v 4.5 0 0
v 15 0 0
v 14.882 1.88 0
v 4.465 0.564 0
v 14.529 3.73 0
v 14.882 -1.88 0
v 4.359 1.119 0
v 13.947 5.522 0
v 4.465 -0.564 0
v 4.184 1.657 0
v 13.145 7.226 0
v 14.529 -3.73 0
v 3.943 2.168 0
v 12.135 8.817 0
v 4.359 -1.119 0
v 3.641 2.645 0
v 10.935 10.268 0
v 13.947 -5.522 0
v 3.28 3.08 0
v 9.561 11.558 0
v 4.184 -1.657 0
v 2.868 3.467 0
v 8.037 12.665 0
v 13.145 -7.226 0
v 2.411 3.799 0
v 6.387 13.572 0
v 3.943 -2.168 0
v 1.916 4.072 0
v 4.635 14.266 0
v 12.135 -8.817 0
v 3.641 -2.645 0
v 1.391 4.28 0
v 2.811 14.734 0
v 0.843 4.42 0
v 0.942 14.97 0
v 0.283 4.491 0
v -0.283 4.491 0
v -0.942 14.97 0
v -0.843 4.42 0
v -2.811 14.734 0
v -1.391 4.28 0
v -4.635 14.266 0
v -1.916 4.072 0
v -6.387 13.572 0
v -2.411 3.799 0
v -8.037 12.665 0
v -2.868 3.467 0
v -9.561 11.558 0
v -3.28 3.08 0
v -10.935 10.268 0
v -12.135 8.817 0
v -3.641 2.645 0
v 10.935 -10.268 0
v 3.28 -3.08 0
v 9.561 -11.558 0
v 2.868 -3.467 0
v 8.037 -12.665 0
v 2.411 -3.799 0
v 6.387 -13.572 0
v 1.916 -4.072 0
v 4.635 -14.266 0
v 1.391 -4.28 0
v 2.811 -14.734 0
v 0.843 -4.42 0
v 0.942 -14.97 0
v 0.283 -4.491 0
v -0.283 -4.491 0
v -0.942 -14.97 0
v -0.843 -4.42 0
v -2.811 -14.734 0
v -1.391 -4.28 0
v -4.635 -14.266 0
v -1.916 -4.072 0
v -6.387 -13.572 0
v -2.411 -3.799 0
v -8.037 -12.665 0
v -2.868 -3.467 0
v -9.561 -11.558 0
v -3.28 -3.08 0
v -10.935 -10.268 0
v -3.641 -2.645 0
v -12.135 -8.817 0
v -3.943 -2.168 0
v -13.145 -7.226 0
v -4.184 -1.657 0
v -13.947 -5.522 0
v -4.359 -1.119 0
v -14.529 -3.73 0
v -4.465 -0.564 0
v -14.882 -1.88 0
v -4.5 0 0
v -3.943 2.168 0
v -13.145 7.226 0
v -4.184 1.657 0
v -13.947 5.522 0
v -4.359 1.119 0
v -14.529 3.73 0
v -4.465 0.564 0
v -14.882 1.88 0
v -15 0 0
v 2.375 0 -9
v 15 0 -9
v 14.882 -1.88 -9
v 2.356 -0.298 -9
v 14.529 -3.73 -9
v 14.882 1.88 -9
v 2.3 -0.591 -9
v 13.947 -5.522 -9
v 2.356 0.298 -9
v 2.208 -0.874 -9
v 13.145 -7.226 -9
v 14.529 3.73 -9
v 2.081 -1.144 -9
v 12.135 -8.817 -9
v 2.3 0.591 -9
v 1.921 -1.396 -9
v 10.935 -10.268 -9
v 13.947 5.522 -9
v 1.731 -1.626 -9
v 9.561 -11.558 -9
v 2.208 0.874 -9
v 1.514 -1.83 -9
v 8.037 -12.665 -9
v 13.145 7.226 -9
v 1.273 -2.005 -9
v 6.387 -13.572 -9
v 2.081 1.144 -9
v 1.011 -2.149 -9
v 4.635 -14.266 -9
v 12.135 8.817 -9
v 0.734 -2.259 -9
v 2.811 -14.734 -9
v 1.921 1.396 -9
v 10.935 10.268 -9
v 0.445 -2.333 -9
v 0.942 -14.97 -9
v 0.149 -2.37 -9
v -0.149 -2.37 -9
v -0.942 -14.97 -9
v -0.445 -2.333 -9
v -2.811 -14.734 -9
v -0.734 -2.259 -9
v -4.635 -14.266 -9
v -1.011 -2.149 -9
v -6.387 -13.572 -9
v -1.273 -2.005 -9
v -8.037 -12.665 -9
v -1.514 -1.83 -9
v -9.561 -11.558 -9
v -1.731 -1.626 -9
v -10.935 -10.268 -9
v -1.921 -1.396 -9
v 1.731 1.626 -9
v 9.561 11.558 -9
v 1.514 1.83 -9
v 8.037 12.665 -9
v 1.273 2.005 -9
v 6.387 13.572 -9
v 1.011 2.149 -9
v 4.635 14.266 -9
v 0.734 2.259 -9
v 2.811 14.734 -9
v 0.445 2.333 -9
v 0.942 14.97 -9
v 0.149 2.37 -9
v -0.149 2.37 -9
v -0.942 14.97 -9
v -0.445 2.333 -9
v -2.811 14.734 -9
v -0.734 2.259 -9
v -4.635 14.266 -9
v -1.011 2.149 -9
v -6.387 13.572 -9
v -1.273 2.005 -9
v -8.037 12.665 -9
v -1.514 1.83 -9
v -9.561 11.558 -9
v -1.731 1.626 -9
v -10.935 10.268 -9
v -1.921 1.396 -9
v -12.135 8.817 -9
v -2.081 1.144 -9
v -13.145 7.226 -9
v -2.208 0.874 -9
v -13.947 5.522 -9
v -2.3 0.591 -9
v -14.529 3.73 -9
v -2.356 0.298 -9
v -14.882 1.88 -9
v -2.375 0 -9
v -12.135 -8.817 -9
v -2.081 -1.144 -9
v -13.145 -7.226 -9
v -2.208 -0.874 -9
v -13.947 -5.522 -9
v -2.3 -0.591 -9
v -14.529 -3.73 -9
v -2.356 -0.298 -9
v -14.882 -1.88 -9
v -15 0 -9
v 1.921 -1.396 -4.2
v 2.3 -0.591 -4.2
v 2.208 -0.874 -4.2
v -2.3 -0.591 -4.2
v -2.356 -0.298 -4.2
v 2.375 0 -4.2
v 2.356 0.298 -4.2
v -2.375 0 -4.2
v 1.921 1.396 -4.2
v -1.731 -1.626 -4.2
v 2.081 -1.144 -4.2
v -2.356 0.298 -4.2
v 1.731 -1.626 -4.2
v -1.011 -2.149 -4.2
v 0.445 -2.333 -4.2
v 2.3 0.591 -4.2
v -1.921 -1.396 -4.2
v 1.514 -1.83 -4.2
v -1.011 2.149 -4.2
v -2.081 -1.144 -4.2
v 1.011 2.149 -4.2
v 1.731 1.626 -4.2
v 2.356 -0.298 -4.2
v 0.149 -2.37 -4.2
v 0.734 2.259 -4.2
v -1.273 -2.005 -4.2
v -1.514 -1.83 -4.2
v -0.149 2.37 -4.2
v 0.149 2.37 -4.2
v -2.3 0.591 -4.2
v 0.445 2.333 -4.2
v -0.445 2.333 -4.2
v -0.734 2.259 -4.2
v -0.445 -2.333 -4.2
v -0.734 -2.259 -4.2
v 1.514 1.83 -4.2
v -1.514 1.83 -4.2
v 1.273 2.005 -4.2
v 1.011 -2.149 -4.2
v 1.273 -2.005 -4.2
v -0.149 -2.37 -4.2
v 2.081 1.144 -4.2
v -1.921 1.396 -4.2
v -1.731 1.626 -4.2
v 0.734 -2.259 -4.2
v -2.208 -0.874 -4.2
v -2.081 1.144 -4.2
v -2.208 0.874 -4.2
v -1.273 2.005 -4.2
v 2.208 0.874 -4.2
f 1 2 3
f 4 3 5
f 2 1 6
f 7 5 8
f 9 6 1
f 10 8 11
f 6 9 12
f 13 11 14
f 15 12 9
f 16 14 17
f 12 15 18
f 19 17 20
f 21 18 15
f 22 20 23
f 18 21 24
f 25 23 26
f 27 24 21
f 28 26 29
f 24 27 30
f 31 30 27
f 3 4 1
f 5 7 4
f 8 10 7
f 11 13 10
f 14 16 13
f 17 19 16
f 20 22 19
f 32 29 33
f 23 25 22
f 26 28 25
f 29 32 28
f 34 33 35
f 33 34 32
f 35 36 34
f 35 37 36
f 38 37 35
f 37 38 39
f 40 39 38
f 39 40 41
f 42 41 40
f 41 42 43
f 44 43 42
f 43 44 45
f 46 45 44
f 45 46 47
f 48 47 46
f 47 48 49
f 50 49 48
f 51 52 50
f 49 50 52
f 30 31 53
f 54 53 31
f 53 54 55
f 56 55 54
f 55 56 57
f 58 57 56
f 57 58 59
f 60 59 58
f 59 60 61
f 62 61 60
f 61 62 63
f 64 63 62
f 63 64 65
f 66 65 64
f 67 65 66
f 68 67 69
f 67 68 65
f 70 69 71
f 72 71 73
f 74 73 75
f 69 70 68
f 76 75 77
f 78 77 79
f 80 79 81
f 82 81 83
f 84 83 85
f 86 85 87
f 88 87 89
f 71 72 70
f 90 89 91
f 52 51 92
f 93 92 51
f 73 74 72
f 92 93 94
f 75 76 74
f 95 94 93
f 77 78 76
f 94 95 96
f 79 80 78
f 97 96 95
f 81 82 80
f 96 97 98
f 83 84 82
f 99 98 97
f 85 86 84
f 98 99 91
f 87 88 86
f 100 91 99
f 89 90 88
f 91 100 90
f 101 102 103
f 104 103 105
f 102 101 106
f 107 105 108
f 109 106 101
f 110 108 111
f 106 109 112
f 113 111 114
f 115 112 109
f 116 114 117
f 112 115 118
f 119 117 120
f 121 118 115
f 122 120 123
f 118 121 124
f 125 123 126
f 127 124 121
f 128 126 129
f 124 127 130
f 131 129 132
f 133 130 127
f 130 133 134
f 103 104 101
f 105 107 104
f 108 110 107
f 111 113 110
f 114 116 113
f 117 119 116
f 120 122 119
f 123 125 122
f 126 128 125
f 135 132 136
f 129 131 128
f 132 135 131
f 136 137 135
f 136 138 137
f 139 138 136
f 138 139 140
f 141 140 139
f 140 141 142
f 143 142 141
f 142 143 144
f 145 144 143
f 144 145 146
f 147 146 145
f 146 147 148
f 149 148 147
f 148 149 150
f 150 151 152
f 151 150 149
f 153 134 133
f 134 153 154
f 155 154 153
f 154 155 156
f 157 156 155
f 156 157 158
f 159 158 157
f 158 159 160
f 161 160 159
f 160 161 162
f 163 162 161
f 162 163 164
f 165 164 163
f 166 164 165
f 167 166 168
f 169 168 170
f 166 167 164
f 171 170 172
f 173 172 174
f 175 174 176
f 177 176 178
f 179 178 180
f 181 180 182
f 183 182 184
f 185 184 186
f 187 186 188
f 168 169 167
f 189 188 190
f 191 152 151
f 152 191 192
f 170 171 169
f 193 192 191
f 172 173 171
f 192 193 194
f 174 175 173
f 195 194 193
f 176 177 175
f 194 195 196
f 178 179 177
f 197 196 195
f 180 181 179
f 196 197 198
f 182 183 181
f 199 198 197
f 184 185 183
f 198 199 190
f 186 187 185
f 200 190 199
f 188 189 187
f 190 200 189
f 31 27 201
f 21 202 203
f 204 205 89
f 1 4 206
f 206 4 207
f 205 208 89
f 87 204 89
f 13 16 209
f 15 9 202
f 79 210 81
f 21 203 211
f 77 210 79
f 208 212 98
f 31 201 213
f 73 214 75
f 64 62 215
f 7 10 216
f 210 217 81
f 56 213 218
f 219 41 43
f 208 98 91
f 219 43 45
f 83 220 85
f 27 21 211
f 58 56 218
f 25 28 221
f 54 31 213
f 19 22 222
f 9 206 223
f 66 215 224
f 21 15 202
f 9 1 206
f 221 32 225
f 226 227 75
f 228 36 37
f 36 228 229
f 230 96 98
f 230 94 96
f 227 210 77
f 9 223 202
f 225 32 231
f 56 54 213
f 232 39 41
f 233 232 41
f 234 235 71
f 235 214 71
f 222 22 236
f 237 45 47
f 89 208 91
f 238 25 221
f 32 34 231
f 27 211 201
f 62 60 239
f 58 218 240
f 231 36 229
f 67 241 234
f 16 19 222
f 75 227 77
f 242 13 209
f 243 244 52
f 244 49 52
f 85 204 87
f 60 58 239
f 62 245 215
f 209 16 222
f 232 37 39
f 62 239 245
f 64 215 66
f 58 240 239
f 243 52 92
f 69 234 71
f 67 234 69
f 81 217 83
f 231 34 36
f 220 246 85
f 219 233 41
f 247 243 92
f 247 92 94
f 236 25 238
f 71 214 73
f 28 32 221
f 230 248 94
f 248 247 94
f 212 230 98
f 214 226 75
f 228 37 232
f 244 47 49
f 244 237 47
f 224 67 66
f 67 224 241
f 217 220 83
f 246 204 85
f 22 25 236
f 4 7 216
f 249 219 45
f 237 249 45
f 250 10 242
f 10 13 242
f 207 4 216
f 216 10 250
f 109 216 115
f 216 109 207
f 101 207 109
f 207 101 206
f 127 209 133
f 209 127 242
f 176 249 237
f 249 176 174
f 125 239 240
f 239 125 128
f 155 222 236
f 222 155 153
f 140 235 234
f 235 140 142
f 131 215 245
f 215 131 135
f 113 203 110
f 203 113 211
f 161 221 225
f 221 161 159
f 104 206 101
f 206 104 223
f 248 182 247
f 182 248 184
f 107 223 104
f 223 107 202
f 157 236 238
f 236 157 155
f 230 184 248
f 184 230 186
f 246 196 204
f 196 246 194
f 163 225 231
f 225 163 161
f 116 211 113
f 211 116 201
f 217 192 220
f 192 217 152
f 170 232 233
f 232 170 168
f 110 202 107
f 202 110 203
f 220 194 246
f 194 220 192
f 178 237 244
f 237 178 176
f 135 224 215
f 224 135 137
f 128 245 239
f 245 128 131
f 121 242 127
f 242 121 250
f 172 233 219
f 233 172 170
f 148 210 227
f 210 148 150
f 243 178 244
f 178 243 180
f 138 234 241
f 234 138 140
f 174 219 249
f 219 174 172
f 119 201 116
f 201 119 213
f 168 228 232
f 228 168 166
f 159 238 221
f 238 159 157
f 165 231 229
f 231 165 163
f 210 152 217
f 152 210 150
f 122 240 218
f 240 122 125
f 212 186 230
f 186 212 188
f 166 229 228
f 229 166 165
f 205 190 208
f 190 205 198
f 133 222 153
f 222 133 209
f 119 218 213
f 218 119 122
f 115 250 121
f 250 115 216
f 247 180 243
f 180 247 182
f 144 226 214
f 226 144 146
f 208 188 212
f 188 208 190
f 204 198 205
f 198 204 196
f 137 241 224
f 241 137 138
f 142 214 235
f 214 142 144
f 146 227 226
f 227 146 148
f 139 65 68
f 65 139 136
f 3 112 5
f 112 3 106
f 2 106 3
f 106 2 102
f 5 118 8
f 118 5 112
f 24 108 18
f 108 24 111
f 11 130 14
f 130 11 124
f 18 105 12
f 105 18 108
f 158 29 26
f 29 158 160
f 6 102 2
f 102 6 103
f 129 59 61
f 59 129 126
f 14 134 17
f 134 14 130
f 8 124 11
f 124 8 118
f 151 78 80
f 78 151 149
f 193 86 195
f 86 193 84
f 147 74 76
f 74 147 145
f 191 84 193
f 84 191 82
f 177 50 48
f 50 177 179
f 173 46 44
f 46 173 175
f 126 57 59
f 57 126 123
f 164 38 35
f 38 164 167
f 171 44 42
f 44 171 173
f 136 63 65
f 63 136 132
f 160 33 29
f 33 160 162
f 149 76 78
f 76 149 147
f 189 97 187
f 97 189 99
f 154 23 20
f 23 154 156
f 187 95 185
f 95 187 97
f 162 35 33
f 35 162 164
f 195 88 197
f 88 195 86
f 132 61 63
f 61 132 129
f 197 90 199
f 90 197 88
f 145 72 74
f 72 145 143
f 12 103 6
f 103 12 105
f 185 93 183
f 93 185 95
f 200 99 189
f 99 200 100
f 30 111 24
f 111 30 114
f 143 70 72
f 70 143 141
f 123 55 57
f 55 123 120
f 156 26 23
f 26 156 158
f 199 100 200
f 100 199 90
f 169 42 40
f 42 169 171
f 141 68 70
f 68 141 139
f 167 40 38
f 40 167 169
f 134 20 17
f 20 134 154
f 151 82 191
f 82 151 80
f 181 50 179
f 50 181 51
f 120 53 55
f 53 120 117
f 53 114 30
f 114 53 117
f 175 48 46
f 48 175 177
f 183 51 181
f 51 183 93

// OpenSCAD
$fn = 50;


difference() {
	union() {
		translate(v = [0, 0, -9.0000000000]) {
			cylinder(h = 9, r = 15.0000000000);
		}
	}
	union() {
		translate(v = [0, 0, 0]) {
			rotate(a = [0, 0, 0]) {
				difference() {
					union() {
						#translate(v = [0, 0, -9.0000000000]) {
							cylinder(h = 9, r = 2.2500000000);
						}
						#translate(v = [0, 0, -4.2000000000]) {
							cylinder(h = 4.2000000000, r1 = 2.3750000000, r2 = 4.5000000000);
						}
						#translate(v = [0, 0, -9.0000000000]) {
							cylinder(h = 9, r = 2.3750000000);
						}
						#translate(v = [0, 0, -9.0000000000]) {
							cylinder(h = 9, r = 2.2500000000);
						}
					}
					union();
				}
			}
		}
	}
}
